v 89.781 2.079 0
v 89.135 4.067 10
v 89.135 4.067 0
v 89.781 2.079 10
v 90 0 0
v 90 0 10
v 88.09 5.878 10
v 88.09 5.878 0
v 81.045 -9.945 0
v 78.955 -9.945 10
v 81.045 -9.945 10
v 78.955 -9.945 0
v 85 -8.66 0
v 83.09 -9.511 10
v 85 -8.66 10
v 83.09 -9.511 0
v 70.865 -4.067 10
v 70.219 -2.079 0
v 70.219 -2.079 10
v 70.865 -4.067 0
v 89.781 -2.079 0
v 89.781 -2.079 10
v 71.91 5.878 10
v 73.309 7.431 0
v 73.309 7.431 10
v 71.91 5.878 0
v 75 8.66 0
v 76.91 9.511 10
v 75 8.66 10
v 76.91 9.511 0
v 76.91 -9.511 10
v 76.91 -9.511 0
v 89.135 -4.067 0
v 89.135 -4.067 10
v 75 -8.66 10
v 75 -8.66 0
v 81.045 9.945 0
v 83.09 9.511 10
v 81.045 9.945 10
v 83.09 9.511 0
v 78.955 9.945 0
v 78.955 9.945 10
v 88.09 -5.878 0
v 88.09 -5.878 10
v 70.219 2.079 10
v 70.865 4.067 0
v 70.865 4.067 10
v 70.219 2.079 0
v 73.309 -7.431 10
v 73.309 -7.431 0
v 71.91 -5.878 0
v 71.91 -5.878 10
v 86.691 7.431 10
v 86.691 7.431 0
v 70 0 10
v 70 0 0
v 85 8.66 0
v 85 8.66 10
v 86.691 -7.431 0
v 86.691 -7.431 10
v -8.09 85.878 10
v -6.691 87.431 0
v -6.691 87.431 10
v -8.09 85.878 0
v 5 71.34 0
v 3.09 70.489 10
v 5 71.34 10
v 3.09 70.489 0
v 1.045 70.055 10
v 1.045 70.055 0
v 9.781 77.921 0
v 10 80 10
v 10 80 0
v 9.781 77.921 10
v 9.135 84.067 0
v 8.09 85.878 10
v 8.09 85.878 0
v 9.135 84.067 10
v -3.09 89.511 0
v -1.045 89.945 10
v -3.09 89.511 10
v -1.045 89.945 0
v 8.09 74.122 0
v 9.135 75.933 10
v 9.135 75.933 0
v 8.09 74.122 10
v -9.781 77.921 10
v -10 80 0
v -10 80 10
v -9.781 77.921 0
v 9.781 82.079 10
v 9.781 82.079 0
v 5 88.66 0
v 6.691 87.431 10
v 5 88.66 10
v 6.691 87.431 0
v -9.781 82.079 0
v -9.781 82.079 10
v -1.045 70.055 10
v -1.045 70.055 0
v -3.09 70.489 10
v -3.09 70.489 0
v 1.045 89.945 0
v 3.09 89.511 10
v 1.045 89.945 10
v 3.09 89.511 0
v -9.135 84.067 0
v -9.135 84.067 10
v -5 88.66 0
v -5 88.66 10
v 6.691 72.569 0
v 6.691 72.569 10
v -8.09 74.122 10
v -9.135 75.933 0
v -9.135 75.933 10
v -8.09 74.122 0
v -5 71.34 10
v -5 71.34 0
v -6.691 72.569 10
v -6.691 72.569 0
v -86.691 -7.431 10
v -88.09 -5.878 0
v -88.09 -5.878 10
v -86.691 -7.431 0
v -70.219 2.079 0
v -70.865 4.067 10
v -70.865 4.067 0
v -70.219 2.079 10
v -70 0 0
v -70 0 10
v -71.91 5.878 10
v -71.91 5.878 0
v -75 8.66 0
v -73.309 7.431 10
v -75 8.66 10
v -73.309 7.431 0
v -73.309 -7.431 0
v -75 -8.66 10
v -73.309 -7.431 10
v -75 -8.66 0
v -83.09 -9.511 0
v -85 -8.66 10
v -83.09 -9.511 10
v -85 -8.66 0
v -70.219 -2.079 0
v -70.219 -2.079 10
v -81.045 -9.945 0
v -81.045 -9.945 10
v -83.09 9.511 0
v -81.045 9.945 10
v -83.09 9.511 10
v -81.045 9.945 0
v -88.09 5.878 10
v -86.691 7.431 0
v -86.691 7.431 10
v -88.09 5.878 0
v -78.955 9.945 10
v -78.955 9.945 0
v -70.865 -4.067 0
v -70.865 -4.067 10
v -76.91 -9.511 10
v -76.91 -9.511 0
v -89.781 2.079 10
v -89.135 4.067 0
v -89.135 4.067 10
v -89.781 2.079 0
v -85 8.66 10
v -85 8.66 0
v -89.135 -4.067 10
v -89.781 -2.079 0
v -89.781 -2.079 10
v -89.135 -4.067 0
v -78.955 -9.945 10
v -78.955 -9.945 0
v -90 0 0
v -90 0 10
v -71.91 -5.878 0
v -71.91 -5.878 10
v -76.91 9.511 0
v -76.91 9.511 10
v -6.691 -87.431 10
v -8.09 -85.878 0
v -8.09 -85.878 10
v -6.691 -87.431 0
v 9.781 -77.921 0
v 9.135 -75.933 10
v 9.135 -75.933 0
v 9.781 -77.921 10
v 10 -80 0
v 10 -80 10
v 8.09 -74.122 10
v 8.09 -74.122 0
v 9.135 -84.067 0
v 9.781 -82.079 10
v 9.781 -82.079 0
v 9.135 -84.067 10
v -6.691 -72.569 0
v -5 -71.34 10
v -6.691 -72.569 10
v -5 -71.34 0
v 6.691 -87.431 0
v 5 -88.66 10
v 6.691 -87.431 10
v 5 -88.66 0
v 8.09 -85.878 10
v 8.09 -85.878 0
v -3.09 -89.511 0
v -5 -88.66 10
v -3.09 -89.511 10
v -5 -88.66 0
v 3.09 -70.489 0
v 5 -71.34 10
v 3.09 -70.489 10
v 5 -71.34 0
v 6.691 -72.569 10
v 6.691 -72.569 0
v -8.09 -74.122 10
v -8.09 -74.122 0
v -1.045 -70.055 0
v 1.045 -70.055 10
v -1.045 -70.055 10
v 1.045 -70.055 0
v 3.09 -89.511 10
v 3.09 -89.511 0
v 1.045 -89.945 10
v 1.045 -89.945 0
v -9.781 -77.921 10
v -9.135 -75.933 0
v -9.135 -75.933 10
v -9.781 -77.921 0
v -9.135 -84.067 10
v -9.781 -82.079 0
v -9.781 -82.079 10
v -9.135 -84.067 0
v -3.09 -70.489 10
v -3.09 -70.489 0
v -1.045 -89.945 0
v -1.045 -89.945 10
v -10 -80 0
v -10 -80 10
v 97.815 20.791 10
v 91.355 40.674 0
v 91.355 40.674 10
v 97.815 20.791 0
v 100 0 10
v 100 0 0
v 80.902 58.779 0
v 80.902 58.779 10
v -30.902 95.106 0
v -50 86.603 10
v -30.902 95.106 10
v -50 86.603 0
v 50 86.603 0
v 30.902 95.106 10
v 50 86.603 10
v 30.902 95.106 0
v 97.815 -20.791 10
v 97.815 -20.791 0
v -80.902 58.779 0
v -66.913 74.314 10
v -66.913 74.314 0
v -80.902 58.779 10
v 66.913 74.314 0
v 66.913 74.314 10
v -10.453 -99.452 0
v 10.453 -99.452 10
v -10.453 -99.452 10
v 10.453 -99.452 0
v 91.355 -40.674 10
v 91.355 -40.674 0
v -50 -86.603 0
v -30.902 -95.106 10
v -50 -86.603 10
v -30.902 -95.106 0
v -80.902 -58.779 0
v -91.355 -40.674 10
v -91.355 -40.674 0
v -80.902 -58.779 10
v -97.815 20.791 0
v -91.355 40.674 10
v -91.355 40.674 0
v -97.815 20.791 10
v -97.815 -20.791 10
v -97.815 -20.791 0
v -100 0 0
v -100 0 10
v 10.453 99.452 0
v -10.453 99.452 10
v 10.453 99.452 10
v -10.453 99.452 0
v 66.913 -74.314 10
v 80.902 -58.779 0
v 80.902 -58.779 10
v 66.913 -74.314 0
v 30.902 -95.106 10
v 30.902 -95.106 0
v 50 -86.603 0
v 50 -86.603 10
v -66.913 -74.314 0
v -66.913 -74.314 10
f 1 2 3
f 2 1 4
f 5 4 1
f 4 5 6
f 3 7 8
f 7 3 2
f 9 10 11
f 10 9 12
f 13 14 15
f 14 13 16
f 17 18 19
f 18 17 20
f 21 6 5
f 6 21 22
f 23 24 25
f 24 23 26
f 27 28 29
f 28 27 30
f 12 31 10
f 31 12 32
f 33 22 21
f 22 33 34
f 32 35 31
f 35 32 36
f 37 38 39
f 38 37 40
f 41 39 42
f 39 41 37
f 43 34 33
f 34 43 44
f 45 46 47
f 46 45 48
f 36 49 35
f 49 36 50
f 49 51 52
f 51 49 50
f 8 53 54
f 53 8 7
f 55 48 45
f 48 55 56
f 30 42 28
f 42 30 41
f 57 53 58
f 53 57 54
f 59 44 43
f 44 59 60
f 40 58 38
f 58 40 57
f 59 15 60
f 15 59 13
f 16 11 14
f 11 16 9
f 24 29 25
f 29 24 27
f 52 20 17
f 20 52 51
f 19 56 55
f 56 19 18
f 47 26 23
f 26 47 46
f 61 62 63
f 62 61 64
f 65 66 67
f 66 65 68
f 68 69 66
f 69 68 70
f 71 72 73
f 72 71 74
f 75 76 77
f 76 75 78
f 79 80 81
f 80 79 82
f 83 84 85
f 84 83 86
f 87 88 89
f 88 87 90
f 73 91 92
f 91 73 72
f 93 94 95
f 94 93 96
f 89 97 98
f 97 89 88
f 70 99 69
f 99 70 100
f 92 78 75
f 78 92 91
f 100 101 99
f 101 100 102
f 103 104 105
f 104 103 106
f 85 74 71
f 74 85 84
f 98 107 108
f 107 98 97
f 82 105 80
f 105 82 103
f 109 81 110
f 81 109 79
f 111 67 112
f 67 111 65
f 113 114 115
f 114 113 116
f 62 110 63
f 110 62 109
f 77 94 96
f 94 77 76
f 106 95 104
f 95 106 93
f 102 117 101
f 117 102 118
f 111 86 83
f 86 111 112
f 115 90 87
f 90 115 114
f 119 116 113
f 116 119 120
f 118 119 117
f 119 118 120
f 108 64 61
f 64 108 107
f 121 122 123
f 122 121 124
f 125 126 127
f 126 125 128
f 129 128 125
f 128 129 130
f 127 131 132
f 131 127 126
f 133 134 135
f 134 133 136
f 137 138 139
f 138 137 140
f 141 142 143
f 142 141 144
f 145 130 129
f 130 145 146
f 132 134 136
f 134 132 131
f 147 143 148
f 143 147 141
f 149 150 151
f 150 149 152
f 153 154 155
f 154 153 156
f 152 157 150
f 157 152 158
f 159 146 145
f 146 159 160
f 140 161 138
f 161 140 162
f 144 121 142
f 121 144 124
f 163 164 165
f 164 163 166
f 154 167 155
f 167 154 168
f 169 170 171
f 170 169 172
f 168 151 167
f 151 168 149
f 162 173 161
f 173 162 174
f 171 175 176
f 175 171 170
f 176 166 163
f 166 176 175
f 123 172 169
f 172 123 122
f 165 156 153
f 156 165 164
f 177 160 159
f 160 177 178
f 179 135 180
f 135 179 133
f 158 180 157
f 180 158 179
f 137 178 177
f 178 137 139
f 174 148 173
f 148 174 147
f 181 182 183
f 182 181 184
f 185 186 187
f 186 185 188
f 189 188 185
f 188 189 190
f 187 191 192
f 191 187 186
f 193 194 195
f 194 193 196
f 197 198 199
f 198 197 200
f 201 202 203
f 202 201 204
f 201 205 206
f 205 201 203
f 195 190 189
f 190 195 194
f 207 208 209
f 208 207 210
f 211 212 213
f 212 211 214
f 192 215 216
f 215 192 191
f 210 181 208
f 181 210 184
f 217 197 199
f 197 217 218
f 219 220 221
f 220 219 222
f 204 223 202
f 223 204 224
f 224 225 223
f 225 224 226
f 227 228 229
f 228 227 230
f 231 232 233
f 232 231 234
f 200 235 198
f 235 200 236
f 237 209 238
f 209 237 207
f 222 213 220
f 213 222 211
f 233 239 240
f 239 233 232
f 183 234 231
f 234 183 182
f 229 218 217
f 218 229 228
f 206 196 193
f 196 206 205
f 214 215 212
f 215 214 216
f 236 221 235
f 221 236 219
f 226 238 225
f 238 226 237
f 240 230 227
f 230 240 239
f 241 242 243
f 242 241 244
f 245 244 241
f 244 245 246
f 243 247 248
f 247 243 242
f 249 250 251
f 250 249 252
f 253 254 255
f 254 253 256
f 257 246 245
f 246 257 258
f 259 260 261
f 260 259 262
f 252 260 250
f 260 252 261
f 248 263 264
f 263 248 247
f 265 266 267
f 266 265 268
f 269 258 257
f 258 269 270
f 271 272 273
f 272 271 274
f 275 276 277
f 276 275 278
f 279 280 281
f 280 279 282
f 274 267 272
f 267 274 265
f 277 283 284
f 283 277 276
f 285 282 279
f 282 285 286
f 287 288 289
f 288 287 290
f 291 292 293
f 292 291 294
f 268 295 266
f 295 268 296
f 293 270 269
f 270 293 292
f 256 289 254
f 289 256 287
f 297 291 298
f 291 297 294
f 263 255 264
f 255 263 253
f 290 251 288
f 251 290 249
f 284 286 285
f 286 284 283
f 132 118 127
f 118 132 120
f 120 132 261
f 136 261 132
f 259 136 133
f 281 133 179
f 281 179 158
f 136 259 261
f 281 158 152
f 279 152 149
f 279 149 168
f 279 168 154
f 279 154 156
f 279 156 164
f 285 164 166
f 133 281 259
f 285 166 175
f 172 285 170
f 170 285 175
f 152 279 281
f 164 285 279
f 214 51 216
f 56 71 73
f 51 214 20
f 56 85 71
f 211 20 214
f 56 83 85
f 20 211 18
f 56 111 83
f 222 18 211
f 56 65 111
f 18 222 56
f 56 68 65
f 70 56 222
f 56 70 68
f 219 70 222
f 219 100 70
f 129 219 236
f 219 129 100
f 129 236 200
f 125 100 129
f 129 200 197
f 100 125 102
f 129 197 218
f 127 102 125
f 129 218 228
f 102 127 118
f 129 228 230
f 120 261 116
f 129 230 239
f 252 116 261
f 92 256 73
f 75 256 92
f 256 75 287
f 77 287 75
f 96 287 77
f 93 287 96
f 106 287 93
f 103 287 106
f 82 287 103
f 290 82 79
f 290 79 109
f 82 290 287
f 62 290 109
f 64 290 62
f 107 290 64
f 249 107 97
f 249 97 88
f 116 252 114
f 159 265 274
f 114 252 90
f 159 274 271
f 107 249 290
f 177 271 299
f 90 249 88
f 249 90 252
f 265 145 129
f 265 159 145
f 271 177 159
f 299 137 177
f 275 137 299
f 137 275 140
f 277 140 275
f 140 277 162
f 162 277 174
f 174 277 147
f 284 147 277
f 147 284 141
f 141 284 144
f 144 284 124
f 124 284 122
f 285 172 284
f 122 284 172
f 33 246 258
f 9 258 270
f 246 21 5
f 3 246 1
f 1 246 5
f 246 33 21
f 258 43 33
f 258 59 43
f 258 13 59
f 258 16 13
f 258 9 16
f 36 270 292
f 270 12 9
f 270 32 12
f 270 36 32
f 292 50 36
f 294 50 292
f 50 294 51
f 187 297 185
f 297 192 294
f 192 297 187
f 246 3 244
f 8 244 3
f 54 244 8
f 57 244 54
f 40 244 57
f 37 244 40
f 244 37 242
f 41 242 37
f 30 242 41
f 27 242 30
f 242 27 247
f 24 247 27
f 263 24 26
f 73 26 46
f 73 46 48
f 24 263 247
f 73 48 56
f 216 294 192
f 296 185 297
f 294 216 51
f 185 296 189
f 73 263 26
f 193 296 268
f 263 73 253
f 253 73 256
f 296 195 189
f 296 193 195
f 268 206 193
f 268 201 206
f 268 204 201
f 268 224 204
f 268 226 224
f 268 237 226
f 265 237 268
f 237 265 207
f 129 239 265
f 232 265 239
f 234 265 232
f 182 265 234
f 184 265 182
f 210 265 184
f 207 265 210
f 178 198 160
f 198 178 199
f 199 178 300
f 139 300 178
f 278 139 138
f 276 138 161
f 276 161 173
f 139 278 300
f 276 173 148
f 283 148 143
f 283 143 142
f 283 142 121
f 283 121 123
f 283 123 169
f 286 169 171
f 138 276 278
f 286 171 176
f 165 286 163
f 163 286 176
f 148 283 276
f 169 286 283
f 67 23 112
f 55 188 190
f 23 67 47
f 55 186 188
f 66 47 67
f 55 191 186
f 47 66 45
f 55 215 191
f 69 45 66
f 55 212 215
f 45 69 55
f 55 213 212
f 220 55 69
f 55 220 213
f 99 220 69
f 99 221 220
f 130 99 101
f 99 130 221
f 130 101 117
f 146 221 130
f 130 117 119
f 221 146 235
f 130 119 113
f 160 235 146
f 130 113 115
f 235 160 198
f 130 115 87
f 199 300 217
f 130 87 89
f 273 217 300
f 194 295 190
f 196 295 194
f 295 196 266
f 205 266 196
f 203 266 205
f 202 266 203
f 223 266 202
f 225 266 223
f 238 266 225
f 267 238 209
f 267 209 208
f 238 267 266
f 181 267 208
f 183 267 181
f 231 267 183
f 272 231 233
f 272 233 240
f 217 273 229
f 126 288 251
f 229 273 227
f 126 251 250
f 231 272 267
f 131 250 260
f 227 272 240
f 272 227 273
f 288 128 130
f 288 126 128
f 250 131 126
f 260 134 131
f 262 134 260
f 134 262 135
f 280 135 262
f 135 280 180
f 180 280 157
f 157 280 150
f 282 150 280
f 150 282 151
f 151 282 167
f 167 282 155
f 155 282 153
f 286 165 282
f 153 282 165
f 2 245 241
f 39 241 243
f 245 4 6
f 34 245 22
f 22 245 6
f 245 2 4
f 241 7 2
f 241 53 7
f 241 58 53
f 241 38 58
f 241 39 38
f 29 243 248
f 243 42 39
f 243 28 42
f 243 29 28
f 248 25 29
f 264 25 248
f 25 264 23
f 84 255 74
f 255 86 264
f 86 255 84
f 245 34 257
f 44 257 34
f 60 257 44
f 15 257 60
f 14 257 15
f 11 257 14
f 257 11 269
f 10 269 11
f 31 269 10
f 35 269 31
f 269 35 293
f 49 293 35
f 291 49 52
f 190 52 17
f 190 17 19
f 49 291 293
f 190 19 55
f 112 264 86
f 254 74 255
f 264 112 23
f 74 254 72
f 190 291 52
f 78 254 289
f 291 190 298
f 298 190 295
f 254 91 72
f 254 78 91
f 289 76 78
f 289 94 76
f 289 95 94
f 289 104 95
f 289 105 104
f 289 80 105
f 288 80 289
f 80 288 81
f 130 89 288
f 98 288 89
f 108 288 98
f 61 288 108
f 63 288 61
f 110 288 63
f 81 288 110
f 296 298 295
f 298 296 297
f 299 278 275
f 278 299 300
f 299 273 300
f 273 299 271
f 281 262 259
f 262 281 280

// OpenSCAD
difference(){
cylinder(10,100,100,$fn=30);

r = 80;
for (i=[0:90:359]) {
    translate([r*cos(i),r*sin(i),-1])
        cylinder(12,10,10,$fn=30);
}

}
